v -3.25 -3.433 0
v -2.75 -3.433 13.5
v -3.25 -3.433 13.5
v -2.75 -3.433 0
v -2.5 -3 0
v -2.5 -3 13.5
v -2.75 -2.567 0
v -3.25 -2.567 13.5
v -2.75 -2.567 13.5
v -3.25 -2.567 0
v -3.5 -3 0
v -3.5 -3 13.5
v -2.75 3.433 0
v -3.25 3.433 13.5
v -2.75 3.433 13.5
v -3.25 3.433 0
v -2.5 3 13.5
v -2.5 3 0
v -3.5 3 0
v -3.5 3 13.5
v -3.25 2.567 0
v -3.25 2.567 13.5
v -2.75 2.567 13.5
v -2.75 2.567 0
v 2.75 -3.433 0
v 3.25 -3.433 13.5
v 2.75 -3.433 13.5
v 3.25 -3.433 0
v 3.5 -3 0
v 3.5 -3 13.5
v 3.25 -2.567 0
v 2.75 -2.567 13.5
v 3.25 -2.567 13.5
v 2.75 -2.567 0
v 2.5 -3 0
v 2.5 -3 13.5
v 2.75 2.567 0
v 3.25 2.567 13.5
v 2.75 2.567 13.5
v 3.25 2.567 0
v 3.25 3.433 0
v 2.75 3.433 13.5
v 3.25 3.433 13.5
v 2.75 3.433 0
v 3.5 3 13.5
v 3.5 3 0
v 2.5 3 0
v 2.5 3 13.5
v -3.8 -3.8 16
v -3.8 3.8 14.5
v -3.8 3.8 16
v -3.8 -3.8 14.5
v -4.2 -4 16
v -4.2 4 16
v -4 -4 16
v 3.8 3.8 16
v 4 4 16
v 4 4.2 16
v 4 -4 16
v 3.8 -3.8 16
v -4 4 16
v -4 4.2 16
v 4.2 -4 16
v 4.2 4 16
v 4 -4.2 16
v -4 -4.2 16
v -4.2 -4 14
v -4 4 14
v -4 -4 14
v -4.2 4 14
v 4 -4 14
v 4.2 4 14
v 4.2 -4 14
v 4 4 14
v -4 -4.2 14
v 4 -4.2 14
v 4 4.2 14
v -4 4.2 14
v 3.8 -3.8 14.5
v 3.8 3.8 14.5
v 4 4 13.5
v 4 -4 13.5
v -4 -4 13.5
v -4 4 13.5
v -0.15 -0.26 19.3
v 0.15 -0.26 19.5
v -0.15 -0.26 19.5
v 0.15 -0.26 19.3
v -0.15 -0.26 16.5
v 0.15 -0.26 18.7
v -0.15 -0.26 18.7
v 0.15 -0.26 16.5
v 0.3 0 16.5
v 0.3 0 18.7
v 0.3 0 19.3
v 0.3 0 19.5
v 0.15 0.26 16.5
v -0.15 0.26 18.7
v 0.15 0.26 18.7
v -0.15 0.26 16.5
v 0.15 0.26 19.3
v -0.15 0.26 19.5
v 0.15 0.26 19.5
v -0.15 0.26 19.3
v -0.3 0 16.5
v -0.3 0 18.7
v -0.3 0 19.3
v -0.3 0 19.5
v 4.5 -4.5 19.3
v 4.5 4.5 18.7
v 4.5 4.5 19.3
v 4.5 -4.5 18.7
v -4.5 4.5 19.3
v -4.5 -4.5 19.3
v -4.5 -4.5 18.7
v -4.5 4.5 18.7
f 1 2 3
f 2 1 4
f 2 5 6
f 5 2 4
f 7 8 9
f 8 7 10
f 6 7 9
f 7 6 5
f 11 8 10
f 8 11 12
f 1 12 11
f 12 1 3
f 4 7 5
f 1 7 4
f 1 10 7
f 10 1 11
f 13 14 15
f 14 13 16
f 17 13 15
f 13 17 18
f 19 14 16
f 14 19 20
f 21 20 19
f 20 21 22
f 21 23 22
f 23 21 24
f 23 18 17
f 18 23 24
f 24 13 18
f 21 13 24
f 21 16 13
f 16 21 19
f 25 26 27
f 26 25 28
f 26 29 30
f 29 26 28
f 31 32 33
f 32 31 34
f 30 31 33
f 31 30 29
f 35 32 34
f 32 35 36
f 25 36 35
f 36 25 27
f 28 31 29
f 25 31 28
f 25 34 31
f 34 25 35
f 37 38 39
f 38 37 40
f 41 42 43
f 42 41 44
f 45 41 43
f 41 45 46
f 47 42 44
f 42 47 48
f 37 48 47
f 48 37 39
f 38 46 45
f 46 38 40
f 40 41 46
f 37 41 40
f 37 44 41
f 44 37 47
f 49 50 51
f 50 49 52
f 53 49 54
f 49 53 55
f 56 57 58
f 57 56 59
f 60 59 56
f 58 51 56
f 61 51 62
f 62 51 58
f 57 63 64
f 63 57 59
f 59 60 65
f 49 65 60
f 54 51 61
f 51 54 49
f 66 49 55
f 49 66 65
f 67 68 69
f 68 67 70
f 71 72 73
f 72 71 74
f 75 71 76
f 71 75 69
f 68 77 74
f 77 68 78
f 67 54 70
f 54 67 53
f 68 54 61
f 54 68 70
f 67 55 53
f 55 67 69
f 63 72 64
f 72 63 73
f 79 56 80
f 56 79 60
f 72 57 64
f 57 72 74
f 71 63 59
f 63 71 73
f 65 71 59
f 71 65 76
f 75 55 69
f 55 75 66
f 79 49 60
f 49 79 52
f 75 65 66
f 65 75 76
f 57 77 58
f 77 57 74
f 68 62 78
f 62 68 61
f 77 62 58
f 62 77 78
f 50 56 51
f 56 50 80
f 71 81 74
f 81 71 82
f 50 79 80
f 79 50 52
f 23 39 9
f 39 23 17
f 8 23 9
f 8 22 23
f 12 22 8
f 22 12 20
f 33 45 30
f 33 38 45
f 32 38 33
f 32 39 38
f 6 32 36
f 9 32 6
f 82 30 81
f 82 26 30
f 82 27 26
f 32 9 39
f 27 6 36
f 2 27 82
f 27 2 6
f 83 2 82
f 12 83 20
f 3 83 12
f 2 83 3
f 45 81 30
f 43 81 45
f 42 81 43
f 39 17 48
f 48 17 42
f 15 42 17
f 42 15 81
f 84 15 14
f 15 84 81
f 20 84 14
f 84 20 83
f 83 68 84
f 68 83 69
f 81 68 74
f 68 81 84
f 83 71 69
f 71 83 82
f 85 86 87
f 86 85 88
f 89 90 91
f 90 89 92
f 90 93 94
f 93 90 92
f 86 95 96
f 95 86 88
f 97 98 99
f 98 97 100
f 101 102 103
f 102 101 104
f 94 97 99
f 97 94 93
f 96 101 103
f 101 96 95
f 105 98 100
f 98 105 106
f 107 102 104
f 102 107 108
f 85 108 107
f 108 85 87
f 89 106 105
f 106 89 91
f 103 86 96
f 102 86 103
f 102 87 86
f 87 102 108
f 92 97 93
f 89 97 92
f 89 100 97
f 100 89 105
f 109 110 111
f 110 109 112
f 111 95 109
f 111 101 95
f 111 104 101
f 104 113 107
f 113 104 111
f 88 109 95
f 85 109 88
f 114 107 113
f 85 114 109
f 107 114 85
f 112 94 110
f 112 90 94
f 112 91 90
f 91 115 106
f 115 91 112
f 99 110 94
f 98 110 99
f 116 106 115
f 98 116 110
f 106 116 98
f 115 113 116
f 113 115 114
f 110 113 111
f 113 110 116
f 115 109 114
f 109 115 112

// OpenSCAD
// 瞭望塔 (battle_watchtower) — 枪战制高点
// 四腿 + 平台 + 护栏 + 顶棚，可上塔架枪
$fn = 6;

module watchtower() {
  h = 14;
  // 四腿
  for (dx = [-3, 3], dy = [-3, 3]) {
    color([0.45, 0.33, 0.22]) translate([dx, dy, 0]) cylinder(h = h, r = 0.5);
  }
  // 平台
  color([0.60, 0.50, 0.40]) translate([0, 0, h]) cube([8, 8, 1], center = true);
  // 护栏
  for (dx = [-4, 4]) color([0.50, 0.40, 0.30]) translate([dx, 0, h + 1]) cube([0.4, 8, 2], center = true);
  for (dy = [-4, 4]) color([0.50, 0.40, 0.30]) translate([0, dy, h + 1]) cube([8, 0.4, 2], center = true);
  // 顶棚支柱 + 顶棚
  color([0.50, 0.40, 0.30]) translate([0, 0, h + 2.5]) cylinder(h = 3, r = 0.3);
  color([0.40, 0.45, 0.50]) translate([0, 0, h + 5]) cube([9, 9, 0.6], center = true);
}

watchtower();
